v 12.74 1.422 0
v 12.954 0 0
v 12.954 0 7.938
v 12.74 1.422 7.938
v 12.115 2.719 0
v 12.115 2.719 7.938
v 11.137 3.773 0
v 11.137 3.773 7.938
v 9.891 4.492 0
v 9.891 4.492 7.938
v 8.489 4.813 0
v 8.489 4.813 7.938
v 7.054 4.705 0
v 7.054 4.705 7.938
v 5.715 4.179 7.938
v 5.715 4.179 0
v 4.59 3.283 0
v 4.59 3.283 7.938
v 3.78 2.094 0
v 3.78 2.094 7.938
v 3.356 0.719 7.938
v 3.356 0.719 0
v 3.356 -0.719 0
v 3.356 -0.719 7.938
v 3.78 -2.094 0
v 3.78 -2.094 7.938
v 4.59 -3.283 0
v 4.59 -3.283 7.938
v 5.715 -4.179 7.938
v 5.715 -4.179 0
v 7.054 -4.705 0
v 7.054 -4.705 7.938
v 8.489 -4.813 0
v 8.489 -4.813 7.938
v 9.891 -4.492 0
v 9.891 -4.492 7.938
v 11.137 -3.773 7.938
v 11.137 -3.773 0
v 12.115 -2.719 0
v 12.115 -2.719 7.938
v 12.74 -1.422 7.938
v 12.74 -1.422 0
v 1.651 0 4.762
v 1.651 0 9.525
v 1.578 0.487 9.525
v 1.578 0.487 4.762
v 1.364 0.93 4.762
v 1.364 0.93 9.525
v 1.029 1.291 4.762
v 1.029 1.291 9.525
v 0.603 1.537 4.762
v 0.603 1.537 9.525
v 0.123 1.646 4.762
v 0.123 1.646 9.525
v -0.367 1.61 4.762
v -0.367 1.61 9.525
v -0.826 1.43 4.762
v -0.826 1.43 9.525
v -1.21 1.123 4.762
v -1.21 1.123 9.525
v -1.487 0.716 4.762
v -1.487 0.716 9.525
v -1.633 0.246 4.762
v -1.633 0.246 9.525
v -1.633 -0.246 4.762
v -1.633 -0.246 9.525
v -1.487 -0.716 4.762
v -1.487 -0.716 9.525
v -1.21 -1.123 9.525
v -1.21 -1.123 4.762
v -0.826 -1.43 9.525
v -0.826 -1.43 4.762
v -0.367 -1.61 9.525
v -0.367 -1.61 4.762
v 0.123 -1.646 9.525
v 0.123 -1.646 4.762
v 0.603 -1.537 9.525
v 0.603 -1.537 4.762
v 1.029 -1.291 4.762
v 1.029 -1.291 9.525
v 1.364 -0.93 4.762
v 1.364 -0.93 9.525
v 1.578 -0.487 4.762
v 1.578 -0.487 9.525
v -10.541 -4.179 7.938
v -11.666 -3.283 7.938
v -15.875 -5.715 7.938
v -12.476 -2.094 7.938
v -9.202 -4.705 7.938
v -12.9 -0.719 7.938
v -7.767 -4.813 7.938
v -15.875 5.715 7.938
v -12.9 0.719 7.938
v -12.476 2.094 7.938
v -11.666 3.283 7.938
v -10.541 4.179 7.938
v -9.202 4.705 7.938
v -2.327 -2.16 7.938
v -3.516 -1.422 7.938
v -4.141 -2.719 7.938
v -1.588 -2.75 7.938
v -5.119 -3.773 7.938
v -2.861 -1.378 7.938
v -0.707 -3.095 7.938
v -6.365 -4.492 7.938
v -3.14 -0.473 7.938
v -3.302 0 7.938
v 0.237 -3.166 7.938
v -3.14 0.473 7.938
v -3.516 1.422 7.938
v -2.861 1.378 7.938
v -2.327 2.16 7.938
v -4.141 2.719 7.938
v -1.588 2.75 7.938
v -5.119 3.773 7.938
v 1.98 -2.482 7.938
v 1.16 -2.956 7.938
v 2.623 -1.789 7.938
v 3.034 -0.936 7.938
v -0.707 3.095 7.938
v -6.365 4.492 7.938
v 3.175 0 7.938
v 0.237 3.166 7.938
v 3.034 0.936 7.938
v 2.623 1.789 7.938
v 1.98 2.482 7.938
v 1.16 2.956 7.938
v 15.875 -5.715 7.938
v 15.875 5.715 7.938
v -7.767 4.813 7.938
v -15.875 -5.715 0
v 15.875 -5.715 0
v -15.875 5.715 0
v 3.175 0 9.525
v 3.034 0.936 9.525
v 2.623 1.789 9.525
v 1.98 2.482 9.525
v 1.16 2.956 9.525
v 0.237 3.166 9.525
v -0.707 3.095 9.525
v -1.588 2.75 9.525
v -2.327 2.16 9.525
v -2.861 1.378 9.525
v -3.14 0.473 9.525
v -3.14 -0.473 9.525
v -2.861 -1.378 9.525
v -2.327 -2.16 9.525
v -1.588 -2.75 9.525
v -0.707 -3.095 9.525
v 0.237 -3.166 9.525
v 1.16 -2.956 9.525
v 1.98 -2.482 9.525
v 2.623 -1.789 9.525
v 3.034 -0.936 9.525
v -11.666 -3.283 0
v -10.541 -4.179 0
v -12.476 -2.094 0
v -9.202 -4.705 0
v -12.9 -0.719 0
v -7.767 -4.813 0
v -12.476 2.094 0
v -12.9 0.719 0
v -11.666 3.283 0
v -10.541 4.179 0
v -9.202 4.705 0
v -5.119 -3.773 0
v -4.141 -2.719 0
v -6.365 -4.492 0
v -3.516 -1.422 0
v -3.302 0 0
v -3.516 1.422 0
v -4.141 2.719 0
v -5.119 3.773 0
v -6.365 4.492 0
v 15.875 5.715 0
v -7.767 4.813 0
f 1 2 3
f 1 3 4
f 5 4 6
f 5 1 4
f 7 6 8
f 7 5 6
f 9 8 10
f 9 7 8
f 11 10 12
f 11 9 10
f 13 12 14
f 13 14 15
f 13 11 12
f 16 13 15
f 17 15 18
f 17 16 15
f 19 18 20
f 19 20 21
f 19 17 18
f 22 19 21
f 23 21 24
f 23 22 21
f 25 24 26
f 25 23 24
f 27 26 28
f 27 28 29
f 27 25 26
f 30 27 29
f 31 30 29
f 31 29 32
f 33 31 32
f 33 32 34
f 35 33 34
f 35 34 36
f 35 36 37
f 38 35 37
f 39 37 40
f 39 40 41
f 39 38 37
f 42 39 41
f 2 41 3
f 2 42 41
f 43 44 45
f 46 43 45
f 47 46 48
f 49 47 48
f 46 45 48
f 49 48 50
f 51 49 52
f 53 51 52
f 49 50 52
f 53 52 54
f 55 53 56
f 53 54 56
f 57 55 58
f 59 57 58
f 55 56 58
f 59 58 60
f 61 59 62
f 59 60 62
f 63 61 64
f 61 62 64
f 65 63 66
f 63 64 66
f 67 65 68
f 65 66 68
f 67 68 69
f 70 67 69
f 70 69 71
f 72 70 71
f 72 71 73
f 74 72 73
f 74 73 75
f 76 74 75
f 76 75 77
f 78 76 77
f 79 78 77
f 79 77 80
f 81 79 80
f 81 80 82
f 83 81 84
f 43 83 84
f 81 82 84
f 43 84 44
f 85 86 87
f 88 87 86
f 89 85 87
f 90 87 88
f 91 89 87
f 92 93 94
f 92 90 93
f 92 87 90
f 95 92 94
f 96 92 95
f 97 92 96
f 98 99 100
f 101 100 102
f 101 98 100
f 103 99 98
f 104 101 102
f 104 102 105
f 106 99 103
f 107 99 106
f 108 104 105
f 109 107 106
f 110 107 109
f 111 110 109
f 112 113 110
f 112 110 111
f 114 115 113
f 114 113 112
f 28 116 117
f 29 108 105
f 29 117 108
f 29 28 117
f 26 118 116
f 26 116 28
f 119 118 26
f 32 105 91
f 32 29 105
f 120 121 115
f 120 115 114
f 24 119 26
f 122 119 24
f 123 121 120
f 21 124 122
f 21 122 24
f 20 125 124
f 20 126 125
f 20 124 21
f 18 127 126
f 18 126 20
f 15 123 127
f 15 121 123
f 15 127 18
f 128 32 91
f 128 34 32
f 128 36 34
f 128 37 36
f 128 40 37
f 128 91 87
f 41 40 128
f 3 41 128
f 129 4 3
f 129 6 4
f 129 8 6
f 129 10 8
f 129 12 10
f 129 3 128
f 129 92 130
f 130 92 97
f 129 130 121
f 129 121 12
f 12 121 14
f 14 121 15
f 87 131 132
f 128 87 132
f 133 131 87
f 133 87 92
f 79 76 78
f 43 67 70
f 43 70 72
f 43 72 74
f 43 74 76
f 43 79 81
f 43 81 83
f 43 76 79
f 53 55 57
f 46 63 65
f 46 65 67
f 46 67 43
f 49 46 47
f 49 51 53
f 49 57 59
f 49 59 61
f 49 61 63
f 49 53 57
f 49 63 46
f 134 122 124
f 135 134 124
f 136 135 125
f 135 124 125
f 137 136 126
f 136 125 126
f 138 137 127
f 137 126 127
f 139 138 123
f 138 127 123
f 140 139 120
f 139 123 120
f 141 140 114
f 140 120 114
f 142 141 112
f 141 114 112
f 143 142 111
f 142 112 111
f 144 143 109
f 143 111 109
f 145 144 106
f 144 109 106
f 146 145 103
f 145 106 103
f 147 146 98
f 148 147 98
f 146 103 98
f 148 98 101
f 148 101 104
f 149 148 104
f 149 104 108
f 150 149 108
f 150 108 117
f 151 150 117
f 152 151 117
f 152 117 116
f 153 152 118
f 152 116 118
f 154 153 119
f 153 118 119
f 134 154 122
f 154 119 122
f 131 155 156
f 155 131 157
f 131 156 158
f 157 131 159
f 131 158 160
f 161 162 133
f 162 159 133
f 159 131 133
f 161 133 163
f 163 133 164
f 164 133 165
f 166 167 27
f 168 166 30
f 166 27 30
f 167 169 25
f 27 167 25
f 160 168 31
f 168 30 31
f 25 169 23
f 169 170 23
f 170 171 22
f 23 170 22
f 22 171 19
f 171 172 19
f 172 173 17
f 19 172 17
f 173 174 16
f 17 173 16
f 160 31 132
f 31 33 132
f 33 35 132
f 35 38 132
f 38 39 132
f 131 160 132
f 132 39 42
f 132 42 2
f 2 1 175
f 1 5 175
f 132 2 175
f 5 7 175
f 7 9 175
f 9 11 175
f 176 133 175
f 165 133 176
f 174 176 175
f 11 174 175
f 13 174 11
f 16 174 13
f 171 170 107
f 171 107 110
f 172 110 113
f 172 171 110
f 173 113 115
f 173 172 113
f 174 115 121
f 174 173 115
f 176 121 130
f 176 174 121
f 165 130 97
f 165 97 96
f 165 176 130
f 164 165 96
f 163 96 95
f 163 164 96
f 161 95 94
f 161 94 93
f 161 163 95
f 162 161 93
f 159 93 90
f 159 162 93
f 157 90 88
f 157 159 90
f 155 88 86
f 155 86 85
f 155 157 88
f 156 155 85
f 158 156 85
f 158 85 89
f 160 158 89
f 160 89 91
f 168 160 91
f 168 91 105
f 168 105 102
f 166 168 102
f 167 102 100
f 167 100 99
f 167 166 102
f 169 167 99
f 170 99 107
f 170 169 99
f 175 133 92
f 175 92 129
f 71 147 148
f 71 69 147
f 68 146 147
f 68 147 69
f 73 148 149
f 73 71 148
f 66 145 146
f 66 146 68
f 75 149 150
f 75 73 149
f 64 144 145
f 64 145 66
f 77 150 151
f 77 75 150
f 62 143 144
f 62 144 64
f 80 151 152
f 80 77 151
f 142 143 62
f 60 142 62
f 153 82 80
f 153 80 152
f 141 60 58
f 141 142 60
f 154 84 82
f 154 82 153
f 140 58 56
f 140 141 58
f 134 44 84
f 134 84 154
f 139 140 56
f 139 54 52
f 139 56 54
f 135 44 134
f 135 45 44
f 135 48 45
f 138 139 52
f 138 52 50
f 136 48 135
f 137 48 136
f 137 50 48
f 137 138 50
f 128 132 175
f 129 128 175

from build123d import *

# Parameters (mm, degrees)
F0_W     = 31.75
F0_H     = 11.43
F0_R     = 4.826
F1_DEPTH = 7.9375
F2_R     = 3.175
F3_DEPTH = 1.5875
F4_R     = 1.651
F5_DEPTH = 4.7625


with BuildPart() as f1:
    # F0 (on Top) → F1 (new body)
    with BuildSketch(Plane.XY):
        Rectangle(F0_W, F0_H)
        with Locations((-8.128, 0)):
            Circle(F0_R, mode=Mode.SUBTRACT)
        with Locations((8.128, 0)):
            Circle(F0_R, mode=Mode.SUBTRACT)
    extrude(amount=F1_DEPTH)

    # F2 (on face) → F3 (join)
    with BuildSketch(Plane.XY.offset(7.9375)):
        Circle(F2_R)
    extrude(amount=F3_DEPTH)

    # F4 (on face) → F5 (cut)
    with BuildSketch(Plane.XY.offset(9.525)):
        Circle(F4_R)
    extrude(amount=-F5_DEPTH, mode=Mode.SUBTRACT)


solid = f1.part
